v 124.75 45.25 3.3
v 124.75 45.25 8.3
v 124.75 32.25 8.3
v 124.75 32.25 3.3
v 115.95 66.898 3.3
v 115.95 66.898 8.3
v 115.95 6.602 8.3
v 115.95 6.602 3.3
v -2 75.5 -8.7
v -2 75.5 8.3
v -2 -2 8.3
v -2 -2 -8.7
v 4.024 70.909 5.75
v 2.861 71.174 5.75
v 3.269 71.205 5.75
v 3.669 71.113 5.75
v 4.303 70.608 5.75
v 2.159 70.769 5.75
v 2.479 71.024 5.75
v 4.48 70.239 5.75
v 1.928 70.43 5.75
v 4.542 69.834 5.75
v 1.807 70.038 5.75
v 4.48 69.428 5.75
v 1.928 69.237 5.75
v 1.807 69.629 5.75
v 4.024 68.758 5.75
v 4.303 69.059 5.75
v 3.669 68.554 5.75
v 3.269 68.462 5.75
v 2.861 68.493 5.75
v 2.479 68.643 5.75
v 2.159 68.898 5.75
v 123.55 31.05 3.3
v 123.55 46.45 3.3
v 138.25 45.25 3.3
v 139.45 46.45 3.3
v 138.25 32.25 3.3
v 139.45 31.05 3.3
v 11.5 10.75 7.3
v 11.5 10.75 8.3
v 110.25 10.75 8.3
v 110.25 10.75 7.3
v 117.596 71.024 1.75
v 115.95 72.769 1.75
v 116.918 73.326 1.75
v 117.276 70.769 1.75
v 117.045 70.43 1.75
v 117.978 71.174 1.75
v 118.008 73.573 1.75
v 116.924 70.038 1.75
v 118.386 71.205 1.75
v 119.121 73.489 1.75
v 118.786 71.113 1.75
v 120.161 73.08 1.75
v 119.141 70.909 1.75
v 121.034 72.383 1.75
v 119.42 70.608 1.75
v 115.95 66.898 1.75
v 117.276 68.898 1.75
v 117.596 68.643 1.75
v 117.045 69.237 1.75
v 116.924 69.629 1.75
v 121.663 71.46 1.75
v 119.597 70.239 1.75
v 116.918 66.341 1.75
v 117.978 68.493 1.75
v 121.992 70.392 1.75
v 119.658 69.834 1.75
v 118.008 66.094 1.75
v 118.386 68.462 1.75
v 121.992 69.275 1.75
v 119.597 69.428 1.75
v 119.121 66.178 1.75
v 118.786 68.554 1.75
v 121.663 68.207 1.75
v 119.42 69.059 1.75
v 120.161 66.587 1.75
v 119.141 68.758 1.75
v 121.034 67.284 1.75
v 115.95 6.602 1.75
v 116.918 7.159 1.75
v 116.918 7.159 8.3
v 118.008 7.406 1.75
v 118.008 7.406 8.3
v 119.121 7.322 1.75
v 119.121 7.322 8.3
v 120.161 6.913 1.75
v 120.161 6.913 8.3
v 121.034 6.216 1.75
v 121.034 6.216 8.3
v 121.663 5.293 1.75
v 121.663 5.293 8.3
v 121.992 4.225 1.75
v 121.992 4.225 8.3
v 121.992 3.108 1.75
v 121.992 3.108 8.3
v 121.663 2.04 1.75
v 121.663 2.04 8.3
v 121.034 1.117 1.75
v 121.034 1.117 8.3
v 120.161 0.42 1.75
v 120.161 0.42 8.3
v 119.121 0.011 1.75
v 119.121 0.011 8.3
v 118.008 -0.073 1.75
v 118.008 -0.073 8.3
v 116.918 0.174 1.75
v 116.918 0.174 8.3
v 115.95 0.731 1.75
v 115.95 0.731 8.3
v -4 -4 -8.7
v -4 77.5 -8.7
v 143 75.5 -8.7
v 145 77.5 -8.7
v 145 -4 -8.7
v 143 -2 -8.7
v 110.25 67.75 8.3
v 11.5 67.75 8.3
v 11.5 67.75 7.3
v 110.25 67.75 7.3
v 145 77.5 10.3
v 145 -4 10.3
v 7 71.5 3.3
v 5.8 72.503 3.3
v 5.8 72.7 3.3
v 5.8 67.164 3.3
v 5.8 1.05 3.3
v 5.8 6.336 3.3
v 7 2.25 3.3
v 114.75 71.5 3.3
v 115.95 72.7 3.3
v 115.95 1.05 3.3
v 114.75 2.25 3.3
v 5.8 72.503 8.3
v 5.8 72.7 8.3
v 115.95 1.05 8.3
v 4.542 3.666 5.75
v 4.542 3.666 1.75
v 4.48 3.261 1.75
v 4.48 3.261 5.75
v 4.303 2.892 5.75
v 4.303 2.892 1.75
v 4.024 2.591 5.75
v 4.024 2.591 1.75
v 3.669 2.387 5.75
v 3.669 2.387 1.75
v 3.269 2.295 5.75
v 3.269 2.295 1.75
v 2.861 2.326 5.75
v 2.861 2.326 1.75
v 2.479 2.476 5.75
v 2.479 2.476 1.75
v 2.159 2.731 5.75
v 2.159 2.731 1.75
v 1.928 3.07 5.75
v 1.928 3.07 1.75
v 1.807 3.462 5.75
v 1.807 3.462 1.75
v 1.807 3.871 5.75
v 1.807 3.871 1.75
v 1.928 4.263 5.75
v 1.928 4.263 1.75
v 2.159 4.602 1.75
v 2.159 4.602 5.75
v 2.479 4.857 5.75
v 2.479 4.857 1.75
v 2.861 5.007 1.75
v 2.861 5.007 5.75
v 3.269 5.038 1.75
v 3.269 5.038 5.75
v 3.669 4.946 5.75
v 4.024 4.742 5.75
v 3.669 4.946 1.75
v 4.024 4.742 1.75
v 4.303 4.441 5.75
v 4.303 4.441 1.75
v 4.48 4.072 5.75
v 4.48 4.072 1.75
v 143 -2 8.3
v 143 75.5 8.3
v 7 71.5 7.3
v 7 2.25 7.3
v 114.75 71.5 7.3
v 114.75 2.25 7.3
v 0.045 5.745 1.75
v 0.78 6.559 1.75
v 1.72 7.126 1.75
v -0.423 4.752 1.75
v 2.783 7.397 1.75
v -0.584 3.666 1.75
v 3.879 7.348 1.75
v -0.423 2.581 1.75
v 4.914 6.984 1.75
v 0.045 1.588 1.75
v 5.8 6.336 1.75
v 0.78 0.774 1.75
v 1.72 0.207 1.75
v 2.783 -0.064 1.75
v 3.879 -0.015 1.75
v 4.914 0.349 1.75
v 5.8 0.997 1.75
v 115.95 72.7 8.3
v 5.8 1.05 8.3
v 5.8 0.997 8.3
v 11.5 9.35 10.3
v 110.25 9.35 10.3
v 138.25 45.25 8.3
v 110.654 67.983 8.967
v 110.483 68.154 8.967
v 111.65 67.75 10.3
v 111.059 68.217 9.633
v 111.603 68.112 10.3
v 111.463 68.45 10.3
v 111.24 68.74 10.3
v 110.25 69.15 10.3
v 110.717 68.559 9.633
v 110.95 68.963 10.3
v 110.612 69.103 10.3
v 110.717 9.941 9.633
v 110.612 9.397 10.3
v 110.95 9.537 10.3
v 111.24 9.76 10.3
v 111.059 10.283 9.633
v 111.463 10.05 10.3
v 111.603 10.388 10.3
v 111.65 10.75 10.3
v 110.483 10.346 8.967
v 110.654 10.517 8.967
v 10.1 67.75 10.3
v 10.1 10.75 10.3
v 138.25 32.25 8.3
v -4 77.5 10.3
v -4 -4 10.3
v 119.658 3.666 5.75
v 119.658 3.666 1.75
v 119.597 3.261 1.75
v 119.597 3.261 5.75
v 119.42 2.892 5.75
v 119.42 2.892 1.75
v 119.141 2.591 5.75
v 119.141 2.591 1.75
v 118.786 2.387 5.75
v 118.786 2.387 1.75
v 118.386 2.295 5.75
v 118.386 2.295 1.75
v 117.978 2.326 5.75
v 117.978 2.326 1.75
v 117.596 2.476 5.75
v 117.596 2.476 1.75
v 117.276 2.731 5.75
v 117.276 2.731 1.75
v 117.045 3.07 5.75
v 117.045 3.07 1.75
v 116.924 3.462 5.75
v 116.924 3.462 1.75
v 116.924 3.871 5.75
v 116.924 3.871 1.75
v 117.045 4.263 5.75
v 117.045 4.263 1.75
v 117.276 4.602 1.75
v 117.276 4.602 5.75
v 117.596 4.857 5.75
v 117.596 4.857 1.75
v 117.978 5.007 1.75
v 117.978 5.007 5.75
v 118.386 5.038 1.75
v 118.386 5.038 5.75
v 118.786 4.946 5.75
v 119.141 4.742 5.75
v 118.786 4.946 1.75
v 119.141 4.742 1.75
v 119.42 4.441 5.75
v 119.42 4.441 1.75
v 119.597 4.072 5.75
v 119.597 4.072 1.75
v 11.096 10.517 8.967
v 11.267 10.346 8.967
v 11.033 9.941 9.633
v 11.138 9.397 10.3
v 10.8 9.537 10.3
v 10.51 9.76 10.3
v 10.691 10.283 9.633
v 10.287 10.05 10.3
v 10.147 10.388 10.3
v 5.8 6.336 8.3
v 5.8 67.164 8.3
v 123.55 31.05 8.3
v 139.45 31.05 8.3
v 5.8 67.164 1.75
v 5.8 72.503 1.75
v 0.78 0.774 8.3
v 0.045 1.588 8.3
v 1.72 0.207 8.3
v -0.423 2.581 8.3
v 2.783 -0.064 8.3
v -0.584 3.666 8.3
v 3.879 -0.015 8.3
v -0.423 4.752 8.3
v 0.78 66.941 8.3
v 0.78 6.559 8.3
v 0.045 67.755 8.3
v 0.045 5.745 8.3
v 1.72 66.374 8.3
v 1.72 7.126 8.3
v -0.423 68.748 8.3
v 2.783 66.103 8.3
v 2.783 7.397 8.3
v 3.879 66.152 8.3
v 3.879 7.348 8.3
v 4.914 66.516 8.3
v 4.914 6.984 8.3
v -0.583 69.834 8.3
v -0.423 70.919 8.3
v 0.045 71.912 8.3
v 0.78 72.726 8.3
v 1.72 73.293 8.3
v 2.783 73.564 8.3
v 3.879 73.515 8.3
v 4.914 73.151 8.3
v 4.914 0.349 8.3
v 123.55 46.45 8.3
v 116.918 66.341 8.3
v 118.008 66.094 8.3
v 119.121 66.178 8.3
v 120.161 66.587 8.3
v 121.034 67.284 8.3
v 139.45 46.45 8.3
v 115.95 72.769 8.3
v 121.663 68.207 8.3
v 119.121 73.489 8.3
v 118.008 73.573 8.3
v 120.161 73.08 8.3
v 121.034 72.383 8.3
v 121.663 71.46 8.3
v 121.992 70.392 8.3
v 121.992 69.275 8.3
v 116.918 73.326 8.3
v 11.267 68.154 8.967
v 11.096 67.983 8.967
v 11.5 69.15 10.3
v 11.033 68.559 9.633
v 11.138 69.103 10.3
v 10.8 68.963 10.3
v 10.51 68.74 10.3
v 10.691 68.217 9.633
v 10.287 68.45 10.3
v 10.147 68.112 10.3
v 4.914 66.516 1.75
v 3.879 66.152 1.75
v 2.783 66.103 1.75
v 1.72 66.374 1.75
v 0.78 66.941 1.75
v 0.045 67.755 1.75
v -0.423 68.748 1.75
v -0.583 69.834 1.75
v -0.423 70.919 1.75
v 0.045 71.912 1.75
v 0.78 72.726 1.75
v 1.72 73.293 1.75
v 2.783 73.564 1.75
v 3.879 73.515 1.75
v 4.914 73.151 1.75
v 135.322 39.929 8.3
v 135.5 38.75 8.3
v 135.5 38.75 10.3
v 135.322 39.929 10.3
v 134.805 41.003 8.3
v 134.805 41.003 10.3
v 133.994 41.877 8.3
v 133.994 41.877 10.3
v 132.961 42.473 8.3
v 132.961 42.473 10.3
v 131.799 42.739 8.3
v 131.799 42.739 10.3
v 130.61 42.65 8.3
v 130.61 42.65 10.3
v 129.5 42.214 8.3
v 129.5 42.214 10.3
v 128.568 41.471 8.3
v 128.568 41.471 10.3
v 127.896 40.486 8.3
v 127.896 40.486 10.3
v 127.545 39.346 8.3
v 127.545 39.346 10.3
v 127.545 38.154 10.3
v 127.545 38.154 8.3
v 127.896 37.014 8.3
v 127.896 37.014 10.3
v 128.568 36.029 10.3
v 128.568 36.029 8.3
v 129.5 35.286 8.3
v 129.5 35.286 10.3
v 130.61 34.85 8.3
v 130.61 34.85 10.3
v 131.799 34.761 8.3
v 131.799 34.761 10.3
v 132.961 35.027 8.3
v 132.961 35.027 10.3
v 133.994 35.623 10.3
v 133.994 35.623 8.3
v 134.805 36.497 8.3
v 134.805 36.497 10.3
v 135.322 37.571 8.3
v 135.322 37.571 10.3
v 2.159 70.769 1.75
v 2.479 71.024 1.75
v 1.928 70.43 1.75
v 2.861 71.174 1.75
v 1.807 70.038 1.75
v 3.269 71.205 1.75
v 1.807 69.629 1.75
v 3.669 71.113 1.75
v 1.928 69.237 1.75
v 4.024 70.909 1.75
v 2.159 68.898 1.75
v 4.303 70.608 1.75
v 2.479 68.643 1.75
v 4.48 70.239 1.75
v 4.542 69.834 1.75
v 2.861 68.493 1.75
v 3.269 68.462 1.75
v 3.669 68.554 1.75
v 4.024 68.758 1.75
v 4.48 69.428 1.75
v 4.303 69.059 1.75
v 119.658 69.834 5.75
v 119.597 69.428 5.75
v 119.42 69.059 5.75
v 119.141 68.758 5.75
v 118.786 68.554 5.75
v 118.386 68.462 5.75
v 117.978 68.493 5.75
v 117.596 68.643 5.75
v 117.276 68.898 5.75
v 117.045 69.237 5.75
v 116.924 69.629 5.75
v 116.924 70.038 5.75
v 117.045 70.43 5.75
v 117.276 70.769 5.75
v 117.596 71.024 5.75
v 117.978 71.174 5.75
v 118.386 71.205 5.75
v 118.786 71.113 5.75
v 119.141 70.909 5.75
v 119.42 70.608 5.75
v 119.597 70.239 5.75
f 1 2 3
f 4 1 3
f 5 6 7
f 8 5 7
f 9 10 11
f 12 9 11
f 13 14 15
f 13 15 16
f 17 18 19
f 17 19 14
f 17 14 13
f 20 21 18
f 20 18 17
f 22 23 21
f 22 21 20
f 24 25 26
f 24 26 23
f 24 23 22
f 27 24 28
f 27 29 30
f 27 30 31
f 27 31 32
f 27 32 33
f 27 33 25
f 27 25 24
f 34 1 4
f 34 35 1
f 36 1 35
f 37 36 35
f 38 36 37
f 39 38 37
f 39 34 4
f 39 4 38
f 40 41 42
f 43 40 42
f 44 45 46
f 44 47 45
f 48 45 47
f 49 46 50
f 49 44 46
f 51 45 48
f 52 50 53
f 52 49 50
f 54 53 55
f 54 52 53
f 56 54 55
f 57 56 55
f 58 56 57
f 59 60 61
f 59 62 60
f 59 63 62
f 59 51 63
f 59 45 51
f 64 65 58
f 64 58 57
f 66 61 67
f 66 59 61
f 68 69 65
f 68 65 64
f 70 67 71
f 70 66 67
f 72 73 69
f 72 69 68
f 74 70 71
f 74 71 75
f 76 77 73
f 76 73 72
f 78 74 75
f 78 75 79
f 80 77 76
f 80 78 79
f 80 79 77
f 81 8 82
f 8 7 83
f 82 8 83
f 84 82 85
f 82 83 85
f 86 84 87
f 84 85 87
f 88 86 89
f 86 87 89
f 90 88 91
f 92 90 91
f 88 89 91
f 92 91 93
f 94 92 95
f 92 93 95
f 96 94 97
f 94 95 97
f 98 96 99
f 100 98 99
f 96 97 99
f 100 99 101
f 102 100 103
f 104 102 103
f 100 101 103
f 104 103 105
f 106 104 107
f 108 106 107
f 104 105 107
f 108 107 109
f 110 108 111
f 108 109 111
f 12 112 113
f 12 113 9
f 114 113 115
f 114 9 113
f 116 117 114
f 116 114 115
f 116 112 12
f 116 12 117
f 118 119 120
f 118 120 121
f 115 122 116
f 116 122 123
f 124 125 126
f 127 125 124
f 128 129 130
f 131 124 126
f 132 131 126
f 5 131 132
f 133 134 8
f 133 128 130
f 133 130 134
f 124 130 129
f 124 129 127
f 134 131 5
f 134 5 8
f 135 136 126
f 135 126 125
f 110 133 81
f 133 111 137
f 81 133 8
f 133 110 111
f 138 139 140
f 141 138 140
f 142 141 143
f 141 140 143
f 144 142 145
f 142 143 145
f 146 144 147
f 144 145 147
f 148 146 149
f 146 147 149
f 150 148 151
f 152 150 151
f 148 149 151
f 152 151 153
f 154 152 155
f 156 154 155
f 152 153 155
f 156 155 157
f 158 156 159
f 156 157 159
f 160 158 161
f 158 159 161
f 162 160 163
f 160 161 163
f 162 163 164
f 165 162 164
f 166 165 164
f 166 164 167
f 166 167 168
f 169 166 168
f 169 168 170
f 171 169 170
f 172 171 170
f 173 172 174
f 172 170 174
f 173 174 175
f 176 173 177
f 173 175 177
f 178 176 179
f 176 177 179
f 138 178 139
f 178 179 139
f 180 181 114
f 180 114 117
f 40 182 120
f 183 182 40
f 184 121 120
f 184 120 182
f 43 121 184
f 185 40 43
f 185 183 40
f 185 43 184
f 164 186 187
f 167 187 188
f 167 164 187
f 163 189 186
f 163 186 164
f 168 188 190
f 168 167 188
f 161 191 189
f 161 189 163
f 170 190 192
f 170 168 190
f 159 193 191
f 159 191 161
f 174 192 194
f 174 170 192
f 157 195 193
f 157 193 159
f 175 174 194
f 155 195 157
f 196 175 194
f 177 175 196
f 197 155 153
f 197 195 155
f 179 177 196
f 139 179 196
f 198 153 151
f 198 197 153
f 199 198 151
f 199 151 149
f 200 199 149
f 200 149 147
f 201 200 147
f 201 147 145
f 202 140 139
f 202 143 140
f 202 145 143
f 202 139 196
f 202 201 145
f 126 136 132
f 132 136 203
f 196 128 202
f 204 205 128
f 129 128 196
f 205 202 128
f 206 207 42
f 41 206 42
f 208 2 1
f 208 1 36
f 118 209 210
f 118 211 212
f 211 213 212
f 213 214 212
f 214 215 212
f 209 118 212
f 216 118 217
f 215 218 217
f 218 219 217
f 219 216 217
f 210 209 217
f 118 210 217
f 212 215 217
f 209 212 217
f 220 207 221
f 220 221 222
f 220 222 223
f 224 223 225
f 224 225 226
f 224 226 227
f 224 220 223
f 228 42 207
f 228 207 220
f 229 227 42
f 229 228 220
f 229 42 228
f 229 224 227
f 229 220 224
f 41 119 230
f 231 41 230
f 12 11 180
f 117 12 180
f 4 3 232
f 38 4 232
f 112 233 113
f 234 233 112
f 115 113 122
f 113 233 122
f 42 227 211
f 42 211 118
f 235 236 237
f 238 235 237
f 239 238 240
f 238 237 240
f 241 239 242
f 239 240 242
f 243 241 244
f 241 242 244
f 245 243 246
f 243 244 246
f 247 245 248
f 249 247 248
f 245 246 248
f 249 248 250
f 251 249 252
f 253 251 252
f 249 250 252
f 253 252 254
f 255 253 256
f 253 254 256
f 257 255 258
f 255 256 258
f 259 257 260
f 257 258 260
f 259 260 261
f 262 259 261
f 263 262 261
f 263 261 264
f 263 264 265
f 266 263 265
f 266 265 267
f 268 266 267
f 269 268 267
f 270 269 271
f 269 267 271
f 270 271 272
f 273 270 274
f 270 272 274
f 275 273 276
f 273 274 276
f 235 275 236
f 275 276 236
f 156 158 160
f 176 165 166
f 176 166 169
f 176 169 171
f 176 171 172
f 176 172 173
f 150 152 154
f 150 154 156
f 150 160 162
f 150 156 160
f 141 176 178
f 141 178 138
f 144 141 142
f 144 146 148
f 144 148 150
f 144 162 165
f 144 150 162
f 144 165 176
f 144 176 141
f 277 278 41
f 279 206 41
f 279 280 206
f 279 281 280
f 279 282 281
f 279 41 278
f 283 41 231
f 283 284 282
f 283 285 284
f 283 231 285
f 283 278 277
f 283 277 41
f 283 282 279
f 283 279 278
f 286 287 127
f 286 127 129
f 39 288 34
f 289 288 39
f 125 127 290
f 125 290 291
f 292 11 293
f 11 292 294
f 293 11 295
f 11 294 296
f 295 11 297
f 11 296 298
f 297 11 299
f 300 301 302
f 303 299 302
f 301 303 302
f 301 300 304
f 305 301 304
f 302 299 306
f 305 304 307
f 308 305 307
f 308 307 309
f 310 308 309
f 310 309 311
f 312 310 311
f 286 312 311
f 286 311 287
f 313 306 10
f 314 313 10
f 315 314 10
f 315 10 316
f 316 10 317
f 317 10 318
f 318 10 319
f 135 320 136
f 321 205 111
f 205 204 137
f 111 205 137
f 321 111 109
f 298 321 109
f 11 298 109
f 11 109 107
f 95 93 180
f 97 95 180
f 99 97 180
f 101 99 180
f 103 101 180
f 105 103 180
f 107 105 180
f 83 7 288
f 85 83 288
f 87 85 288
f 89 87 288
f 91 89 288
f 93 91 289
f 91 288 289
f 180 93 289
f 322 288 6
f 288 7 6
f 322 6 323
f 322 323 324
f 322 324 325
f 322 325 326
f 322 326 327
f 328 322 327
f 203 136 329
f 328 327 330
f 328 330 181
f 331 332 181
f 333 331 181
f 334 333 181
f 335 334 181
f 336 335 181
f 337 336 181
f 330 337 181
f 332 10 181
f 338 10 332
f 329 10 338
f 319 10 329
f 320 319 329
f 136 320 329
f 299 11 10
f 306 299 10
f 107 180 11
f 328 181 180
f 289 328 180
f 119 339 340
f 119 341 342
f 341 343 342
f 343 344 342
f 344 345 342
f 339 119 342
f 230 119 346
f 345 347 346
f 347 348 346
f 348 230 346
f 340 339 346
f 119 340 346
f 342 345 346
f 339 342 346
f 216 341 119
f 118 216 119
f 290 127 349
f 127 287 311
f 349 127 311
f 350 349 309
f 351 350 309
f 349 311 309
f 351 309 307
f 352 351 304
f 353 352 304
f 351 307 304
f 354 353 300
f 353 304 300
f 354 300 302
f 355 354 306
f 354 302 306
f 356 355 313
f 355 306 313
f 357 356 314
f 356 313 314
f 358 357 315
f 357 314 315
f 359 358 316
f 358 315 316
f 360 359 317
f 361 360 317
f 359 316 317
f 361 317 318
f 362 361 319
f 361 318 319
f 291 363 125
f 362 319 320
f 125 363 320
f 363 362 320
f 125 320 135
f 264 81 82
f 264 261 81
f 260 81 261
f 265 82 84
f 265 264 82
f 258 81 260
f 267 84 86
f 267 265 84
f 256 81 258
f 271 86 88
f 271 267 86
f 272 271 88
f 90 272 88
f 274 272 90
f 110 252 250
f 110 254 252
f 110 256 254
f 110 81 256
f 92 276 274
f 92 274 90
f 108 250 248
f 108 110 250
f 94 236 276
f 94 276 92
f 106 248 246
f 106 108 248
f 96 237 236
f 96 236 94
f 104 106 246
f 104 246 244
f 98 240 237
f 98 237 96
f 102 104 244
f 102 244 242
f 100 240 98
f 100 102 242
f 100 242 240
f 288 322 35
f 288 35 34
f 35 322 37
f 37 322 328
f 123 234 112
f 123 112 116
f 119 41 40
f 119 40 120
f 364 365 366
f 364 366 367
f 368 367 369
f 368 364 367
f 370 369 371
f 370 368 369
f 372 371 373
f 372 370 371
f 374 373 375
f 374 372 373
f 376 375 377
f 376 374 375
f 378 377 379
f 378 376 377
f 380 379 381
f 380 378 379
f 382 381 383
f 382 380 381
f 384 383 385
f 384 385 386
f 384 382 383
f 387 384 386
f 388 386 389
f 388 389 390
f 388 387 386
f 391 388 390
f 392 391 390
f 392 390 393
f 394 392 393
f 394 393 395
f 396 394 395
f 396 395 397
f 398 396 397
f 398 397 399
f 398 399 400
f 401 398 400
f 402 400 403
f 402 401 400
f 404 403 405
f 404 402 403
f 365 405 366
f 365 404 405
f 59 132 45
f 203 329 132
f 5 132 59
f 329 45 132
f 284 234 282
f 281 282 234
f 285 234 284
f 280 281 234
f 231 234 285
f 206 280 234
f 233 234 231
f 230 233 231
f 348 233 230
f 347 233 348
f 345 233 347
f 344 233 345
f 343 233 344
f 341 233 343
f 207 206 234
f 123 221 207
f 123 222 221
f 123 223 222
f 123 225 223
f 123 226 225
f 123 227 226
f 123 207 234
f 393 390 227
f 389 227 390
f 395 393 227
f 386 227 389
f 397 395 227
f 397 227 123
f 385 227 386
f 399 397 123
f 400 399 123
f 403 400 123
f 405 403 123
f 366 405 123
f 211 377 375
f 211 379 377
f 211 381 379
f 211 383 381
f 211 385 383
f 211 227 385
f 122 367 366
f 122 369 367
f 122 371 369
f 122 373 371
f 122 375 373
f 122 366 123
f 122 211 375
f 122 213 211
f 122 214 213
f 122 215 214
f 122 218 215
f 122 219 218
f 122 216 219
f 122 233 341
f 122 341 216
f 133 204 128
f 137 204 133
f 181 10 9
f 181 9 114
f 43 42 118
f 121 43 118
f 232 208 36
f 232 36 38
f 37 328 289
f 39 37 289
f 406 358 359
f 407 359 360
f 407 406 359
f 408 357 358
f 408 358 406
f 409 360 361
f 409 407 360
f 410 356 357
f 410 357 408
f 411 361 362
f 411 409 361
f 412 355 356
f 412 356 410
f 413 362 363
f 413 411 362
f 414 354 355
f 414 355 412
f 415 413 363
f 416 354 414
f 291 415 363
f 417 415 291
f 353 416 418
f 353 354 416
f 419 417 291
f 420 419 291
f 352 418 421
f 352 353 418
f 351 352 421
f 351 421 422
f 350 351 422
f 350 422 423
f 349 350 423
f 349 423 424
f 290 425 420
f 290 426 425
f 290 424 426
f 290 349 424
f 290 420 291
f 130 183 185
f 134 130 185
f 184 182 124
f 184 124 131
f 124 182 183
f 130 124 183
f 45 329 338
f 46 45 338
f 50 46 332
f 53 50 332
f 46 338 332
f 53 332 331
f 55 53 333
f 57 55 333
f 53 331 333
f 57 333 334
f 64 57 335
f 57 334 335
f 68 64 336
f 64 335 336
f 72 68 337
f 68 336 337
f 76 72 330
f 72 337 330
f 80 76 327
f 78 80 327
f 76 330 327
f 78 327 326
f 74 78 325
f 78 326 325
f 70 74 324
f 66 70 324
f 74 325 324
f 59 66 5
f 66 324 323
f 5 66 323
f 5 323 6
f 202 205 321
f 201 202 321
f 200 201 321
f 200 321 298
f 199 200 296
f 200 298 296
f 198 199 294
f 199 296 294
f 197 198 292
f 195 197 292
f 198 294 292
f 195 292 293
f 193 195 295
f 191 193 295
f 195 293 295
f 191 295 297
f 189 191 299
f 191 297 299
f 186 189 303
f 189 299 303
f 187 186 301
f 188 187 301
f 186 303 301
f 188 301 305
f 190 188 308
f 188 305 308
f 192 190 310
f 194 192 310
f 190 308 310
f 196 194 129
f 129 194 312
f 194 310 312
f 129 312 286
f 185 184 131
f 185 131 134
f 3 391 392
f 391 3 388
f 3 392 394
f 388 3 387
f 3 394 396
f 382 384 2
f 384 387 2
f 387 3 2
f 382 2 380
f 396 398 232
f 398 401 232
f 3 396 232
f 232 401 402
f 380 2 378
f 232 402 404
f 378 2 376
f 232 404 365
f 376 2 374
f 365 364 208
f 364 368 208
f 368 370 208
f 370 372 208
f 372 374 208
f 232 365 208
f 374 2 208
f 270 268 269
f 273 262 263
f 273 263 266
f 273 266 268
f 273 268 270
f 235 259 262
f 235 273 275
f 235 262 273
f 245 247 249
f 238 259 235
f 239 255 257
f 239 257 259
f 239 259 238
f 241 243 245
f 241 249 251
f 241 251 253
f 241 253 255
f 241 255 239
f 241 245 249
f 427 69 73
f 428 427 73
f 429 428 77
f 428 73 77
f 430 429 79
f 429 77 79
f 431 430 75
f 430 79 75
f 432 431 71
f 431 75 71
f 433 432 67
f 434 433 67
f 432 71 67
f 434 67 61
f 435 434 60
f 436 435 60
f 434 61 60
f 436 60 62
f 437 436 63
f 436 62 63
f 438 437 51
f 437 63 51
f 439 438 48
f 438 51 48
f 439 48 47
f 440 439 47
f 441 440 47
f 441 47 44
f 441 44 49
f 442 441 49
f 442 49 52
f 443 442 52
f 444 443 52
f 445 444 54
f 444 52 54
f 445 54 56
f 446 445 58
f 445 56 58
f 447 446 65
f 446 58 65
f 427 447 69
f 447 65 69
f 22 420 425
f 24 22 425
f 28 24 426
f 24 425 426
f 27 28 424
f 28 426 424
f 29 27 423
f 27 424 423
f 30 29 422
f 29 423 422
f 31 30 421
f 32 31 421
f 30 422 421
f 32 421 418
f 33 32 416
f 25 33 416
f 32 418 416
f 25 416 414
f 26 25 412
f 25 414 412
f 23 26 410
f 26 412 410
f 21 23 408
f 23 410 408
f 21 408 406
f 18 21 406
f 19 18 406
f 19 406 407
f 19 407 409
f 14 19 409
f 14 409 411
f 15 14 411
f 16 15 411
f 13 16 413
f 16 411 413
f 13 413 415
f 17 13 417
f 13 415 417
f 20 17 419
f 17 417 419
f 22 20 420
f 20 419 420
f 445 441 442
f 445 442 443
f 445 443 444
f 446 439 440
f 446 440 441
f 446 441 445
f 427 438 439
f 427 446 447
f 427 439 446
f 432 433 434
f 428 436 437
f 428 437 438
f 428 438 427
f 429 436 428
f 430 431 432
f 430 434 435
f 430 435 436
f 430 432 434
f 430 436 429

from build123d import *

# Parameters (mm, degrees)
SKETCH008_W     = 149
SKETCH008_H     = 81.5
SKETCH008_R     = 4
SKETCH008_W_2   = 98.75
SKETCH008_H_2   = 57
PAD006_DEPTH    = 2
SKETCH009_W     = 15.9
SKETCH009_H     = 15.4
SKETCH009_W_2   = 13.5
SKETCH009_H_2   = 13
SKETCH009_W_3   = 110.15
SKETCH009_H_3   = 71.65
SKETCH009_W_4   = 107.75
SKETCH009_H_4   = 69.25
PAD007_DEPTH    = 5
SKETCH010_W     = 107.75
SKETCH010_H     = 69.25
SKETCH010_W_2   = 98.75
SKETCH010_H_2   = 57
PAD008_DEPTH    = 1
PAD009_DEPTH    = 6.55
SKETCH012_R     = 1.375
POCKET002_DEPTH = 4
SKETCH014_W     = 149
SKETCH014_H     = 81.5
SKETCH014_W_2   = 145
SKETCH014_H_2   = 77.5
PAD011_DEPTH    = 17
POCKET003_DEPTH = 98.75
POCKET004_DEPTH = 57


with BuildPart() as part:
    # Sketch008 (on Face27 of Binder) → Pad006 (new body)
    with BuildSketch(Plane.XY.offset(8.3)):
        with Locations((70.5, 36.75)):
            Rectangle(SKETCH008_W, SKETCH008_H)
        with Locations((131.5, 38.75)):
            Circle(SKETCH008_R, mode=Mode.SUBTRACT)
        with Locations((60.875, 39.25)):
            Rectangle(SKETCH008_W_2, SKETCH008_H_2, mode=Mode.SUBTRACT)
    extrude(amount=PAD006_DEPTH)

    # Sketch009 (on Face10 of Pad006) → Pad007 (join)
    with BuildSketch(Plane(origin=(0, 0, 8.3), x_dir=(1, 0, 0), z_dir=(0, 0, -1))):
        with Locations((131.5, -38.75)):
            Rectangle(SKETCH009_W, SKETCH009_H)
        with Locations((131.5, -38.75)):
            Rectangle(SKETCH009_W_2, SKETCH009_H_2, mode=Mode.SUBTRACT)
        with Locations((60.875, -36.875)):
            Rectangle(SKETCH009_W_3, SKETCH009_H_3)
        with Locations((60.875, -36.875)):
            Rectangle(SKETCH009_W_4, SKETCH009_H_4, mode=Mode.SUBTRACT)
    extrude(amount=PAD007_DEPTH)

    # Sketch010 (on Face4 of Pad007) → Pad008 (join)
    with BuildSketch(Plane(origin=(0, 0, 8.3), x_dir=(1, 0, 0), z_dir=(0, 0, -1))):
        with Locations((60.875, -36.875)):
            Rectangle(SKETCH010_W, SKETCH010_H)
        with Locations((60.875, -39.25)):
            Rectangle(SKETCH010_W_2, SKETCH010_H_2, mode=Mode.SUBTRACT)
    extrude(amount=PAD008_DEPTH)

    # Sketch011 (on Face4 of Pad008) → Pad009 (join)
    with BuildSketch(Plane(origin=(0, 0, 8.3), x_dir=(1, 0, 0), z_dir=(0, 0, -1))):
        with BuildLine():
            ThreePointArc((5.8, -0.996823), (-0.5835, -3.6665), (5.8, -6.336177))
            Line((5.8, -0.996823), (5.8, -6.336177))
        make_face()
        with BuildLine():
            ThreePointArc((5.8, -67.163823), (-0.5835, -69.8335), (5.8, -72.503177))
            Line((5.8, -67.163823), (5.8, -72.503177))
        make_face()
        with BuildLine():
            ThreePointArc((115.95, -72.76902), (122.0335, -69.8335), (115.95, -66.89798))
            Line((115.95, -72.76902), (115.95, -66.89798))
        make_face()
        with BuildLine():
            ThreePointArc((115.95, -6.60202), (122.0335, -3.6665), (115.95, -0.73098))
            Line((115.95, -0.73098), (115.95, -6.60202))
        make_face()
    extrude(amount=PAD009_DEPTH)

    # Sketch012 (on Face32 of Pad009) → Pocket002 (cut)
    with BuildSketch(Plane(origin=(0, 0, 1.75), x_dir=(1, 0, 0), z_dir=(0, 0, -1))):
        with Locations((118.2835, -3.6665)):
            Circle(SKETCH012_R)
        with Locations((118.2835, -69.8335)):
            Circle(SKETCH012_R)
        with Locations((3.1665, -69.8335)):
            Circle(SKETCH012_R)
        with Locations((3.1665, -3.6665)):
            Circle(SKETCH012_R)
    extrude(amount=-POCKET002_DEPTH, mode=Mode.SUBTRACT)

    # Sketch014 (on Face4 of Pocket002) → Pad011 (join)
    with BuildSketch(Plane(origin=(0, 0, 8.3), x_dir=(1, 0, 0), z_dir=(0, 0, -1))):
        with Locations((70.5, -36.75)):
            Rectangle(SKETCH014_W, SKETCH014_H)
        with Locations((70.5, -36.75)):
            Rectangle(SKETCH014_W_2, SKETCH014_H_2, mode=Mode.SUBTRACT)
    extrude(amount=PAD011_DEPTH)

    # Sketch015 (on Face10 of Pad011) → Pocket003 (cut)
    with BuildSketch(Plane.YZ.offset(11.5)):
        Polygon((67.75, 8.3), (67.75, 10.3), (69.150415, 10.3), align=None)
        Polygon((10.75, 8.3), (10.75, 10.3), (9.349585, 10.3), align=None)
    extrude(amount=POCKET003_DEPTH, mode=Mode.SUBTRACT)

    # Sketch016 (on Face28 of Pocket003) → Pocket004 (cut)
    with BuildSketch(Plane(origin=(0, 10.75, 0), x_dir=(-1, 0, 0), z_dir=(0, 1, 0))):
        Polygon((-110.25, 8.3), (-110.25, 10.3), (-111.650415, 10.3), align=None)
        Polygon((-11.5, 8.3), (-10.099585, 10.3), (-11.5, 10.3), align=None)
    extrude(amount=POCKET004_DEPTH, mode=Mode.SUBTRACT)

    # Sketch017 (on Face19 of Pocket004) → Groove (revolve, cut)
    with BuildSketch(Plane(origin=(0, 10.75, 0), x_dir=(-1, 0, 0), z_dir=(0, 1, 0))):
        Polygon((-110.25, 10.3), (-111.650415, 10.3), (-110.25, 8.3), align=None)
    revolve(axis=Axis((110.25, 10.75, 9.3), (0, 0, 1)), mode=Mode.SUBTRACT)

    # Sketch018 (on Face17 of Groove) → Groove001 (revolve, cut)
    with BuildSketch(Plane.XZ.offset(-67.75)):
        Polygon((111.650415, 10.3), (110.25, 10.3), (110.25, 8.3), align=None)
    revolve(axis=Axis((110.25, 67.75, 9.3), (0, 0, 1)), mode=Mode.SUBTRACT)

    # Sketch019 (on Face14 of Groove001) → Groove002 (revolve, cut)
    with BuildSketch(Plane.YZ.offset(11.5)):
        Polygon((67.75, 8.3), (69.150415, 10.3), (67.75, 10.3), align=None)
    revolve(axis=Axis((11.5, 67.75, 9.3), (0, 0, 1)), mode=Mode.SUBTRACT)

    # Sketch020 (on Face11 of Groove002) → Groove003 (revolve, cut)
    with BuildSketch(Plane(origin=(0, 10.75, 0), x_dir=(-1, 0, 0), z_dir=(0, 1, 0))):
        Polygon((-11.5, 8.3), (-10.099585, 10.3), (-11.5, 10.3), align=None)
    revolve(axis=Axis((11.5, 10.75, 9.3), (0, 0, -1)), mode=Mode.SUBTRACT)


solid = part.part
